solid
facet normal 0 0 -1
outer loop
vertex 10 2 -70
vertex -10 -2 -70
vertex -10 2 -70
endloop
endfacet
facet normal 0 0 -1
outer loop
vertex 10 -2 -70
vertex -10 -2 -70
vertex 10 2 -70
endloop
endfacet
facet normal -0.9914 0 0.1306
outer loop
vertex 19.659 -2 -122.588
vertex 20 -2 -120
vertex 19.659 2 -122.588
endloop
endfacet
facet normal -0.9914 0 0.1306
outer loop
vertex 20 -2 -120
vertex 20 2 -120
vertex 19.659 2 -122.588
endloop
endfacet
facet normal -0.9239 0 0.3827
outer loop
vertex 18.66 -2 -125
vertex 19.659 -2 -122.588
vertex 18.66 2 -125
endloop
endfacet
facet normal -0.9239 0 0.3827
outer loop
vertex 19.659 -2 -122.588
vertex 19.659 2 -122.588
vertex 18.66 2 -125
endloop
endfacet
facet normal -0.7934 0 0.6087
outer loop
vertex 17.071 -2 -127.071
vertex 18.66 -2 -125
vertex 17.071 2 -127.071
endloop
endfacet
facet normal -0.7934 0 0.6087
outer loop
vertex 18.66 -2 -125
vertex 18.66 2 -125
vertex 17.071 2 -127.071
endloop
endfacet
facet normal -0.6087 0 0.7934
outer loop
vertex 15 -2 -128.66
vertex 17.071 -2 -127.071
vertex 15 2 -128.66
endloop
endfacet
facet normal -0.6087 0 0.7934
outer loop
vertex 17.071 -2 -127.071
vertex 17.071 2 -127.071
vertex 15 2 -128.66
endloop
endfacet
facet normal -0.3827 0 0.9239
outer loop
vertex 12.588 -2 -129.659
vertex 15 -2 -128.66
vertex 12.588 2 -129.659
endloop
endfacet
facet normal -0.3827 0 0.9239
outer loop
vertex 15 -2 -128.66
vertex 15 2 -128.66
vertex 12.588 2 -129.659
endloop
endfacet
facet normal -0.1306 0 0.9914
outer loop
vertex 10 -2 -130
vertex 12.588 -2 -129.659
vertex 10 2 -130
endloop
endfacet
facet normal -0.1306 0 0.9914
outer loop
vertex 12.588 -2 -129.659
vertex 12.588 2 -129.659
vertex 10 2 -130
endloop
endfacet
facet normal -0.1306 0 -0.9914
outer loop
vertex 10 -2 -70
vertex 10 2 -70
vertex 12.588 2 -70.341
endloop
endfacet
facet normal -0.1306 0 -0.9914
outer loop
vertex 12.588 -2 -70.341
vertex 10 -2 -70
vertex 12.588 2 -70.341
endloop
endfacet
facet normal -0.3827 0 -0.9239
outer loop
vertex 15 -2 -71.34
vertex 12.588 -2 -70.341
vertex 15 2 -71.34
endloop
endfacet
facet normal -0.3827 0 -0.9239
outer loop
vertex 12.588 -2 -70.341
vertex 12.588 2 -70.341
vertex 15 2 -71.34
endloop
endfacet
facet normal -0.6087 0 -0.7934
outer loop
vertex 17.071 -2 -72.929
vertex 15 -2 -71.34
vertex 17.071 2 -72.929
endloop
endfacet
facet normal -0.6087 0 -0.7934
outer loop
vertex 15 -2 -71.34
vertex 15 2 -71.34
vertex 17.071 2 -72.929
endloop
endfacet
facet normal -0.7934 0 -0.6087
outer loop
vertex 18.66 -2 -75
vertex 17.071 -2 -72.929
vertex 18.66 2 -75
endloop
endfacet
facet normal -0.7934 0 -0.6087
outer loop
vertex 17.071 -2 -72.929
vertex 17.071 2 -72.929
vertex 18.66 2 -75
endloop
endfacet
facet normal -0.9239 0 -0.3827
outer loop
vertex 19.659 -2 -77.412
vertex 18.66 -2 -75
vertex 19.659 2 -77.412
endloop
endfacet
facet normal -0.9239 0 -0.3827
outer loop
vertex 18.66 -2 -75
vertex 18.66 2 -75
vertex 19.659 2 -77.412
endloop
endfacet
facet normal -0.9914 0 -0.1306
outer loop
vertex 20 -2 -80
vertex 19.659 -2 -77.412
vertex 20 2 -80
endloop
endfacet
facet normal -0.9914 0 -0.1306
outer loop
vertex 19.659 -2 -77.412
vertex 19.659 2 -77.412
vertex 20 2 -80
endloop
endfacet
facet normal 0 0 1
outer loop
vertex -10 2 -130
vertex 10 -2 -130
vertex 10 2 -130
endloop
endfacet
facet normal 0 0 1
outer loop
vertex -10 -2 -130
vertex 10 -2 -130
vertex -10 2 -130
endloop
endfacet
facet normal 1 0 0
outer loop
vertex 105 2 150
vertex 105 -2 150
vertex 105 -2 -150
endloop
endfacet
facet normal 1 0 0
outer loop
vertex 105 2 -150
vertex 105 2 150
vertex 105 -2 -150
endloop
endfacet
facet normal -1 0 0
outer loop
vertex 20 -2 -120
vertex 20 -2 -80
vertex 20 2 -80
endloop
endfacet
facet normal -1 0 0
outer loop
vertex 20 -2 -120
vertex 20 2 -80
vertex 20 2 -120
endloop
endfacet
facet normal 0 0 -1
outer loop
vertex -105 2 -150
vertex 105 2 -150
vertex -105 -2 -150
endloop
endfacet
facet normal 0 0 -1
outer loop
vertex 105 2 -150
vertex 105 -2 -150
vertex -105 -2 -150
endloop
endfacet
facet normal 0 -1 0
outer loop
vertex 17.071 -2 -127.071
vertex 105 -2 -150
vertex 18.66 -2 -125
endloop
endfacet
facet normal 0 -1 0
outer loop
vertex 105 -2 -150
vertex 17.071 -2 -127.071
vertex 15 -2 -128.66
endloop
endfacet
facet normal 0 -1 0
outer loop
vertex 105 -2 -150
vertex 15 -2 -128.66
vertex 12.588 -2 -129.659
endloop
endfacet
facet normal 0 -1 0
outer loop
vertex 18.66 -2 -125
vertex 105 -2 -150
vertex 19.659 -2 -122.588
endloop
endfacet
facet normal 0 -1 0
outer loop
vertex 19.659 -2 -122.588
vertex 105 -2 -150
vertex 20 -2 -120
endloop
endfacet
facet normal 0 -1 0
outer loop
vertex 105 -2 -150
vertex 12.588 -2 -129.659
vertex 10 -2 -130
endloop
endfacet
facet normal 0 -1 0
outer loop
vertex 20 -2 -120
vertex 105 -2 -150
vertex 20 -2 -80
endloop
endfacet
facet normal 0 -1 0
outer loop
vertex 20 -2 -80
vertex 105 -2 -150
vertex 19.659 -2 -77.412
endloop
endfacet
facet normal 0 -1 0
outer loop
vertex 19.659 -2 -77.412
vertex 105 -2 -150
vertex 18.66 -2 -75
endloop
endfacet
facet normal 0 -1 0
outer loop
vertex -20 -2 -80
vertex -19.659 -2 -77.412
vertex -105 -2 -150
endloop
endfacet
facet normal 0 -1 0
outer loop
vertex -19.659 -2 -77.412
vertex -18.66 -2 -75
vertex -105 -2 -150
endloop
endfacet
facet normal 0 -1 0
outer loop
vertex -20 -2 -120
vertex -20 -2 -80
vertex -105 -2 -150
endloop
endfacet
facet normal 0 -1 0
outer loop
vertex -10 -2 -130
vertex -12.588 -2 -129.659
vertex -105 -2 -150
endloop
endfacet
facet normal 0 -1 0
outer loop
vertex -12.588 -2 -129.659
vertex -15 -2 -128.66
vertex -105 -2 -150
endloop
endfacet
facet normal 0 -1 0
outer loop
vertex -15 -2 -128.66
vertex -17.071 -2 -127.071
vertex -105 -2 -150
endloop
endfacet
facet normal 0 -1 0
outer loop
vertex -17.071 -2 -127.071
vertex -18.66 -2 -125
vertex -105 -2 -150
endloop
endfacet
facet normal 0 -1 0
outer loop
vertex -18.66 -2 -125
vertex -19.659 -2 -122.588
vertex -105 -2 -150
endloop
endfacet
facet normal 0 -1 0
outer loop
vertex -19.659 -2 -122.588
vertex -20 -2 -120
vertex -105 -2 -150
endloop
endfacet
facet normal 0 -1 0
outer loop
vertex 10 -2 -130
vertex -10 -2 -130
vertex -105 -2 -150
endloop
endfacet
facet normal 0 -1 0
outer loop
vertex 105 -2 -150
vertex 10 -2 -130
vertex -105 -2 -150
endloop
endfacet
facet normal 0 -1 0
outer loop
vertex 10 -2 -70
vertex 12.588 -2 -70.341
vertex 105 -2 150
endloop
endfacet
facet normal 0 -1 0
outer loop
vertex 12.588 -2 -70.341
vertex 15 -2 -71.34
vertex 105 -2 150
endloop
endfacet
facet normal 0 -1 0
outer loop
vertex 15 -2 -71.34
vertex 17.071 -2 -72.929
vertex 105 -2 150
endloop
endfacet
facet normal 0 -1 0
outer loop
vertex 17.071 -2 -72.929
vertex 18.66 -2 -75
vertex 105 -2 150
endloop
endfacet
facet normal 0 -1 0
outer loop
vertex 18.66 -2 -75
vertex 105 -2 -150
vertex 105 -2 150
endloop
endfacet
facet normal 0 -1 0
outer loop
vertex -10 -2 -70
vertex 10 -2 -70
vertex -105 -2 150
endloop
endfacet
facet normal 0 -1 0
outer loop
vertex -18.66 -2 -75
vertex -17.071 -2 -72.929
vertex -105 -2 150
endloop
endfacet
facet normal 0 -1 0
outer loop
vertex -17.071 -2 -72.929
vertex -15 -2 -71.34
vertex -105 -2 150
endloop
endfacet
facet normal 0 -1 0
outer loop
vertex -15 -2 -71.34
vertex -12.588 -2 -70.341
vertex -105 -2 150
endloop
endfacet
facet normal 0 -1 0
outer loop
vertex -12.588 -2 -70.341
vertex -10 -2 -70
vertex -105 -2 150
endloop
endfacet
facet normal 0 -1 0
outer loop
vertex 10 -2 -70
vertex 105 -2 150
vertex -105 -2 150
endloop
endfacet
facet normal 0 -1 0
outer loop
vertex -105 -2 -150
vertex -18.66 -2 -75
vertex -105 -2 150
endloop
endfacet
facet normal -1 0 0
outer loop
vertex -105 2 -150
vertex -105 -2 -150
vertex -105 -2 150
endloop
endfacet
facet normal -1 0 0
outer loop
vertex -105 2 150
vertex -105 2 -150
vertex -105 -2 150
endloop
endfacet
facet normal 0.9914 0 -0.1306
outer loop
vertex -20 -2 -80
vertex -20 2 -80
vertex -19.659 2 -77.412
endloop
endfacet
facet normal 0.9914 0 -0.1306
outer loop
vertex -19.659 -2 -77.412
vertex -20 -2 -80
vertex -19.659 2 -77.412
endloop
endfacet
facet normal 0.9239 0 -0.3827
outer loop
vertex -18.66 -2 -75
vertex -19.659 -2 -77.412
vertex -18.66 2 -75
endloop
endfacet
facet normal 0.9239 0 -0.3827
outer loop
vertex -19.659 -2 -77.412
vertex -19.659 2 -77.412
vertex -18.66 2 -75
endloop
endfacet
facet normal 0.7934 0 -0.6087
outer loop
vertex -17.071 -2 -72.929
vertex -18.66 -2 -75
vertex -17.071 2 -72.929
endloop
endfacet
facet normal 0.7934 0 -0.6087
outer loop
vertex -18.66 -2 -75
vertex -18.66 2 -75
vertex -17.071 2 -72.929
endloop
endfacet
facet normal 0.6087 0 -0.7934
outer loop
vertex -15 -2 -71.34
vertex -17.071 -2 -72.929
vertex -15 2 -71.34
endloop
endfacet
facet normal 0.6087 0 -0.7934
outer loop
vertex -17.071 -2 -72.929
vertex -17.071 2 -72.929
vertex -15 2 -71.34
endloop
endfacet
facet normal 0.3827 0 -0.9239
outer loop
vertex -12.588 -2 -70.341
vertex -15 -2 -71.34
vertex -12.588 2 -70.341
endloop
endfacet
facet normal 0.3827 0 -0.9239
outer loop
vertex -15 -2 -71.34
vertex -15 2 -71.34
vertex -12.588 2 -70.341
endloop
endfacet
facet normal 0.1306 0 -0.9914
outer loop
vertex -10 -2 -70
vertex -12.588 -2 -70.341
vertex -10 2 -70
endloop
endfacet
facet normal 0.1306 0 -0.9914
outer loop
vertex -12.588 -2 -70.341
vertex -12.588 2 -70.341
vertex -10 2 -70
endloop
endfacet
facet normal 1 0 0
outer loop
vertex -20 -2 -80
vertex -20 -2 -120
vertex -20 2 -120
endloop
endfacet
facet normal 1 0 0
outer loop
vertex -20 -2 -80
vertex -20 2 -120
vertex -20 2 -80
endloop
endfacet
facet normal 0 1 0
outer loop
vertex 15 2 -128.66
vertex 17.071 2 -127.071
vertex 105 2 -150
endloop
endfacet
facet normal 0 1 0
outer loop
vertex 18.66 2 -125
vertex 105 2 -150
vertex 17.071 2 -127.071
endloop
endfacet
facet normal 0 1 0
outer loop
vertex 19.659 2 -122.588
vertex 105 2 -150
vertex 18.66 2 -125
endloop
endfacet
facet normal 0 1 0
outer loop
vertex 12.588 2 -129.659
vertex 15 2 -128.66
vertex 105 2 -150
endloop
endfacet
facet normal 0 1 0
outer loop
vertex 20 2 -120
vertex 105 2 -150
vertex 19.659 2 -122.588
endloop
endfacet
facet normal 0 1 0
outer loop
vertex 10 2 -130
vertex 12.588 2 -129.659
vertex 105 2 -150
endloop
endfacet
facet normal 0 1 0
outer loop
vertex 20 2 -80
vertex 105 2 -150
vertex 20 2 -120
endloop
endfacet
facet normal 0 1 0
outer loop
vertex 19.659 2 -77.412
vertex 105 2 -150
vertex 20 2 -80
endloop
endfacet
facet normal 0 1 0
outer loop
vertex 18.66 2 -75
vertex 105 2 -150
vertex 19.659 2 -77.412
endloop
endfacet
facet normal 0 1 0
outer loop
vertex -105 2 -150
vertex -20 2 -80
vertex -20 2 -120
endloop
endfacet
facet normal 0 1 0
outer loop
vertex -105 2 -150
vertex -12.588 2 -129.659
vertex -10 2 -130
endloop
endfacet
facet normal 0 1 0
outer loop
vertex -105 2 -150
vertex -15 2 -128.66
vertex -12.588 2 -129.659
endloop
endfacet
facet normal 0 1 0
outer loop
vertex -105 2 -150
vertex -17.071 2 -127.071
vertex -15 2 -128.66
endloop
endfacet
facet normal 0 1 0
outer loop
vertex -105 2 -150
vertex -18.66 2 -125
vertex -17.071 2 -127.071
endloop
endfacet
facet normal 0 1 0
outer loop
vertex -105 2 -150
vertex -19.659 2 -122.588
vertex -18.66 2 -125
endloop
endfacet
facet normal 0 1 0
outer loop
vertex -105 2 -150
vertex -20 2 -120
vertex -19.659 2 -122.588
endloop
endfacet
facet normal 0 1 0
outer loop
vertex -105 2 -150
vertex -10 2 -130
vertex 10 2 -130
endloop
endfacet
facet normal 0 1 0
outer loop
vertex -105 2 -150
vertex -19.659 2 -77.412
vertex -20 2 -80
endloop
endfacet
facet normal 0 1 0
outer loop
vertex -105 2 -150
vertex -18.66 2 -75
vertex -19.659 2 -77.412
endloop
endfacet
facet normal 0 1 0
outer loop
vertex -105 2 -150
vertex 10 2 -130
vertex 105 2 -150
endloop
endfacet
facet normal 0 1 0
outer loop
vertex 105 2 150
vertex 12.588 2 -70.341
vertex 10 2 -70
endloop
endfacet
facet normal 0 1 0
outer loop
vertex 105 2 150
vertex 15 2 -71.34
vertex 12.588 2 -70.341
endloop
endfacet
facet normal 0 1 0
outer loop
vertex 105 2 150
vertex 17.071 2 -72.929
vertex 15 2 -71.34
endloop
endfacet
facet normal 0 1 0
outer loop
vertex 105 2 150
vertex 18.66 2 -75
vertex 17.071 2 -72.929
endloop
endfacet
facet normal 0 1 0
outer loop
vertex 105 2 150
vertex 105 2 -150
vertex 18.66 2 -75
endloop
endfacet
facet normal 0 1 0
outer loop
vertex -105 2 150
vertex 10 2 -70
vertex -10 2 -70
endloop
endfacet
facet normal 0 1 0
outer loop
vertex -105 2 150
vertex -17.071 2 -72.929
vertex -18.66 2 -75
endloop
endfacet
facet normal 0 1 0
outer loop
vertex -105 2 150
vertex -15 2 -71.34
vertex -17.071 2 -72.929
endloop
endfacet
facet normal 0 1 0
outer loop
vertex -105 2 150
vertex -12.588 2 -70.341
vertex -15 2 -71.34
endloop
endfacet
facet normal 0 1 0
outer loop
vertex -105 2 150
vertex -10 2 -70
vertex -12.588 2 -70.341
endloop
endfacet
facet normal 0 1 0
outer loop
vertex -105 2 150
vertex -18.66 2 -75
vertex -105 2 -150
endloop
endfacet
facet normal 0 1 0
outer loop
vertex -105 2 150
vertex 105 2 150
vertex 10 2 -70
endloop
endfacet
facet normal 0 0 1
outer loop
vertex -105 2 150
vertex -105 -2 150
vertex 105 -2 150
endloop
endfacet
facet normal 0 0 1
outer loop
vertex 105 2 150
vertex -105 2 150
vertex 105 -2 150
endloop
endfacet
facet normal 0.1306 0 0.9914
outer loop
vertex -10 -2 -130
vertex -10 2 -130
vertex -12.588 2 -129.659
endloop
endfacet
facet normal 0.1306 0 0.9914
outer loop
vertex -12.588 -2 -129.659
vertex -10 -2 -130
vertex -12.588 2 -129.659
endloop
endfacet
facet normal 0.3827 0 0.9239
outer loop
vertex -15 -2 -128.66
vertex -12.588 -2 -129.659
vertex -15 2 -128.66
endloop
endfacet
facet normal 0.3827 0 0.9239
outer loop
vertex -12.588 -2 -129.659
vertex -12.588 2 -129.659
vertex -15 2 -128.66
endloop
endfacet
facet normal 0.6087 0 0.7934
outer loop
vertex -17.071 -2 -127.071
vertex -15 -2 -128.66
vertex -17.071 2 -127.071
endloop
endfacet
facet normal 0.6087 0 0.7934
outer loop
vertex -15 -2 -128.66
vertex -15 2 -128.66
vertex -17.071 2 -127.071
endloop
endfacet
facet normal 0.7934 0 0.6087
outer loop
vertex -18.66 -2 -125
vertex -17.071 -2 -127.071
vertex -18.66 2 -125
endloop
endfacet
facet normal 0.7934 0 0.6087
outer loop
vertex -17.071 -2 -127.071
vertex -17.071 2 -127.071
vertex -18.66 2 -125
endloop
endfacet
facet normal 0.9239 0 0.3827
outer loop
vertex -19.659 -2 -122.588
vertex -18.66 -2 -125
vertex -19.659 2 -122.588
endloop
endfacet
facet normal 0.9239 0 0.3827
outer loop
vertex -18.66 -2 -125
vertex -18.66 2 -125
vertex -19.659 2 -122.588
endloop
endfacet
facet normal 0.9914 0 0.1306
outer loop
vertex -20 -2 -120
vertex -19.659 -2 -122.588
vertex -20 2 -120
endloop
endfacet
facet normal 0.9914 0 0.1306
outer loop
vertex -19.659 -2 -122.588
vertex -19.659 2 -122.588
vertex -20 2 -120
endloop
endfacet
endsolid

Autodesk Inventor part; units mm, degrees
sketch "Эскиз2" plane through (0, 0, 0) normal (0, 1, 0) x (-1, 0, 0)
  line L0 (105, 150) -> (-105, 150)
  line L1 (-105, 150) -> (-105, -150)
  line L2 (-105, -150) -> (105, -150)
  line L3 (105, -150) -> (105, 150)
  line L4 (105, 150) -> (-105, -150) construction
  line L5 (-105, 150) -> (105, -150) construction
  point P0 (0, 0)
  dimension "d0" = 300
  dimension "d1" = 210
extrude "Выдавливание1" add sketch "Эскиз2" along normal mid plane 4
sketch "Эскиз3" plane through (0, -2, 0) normal (0, -1, 0) x (1, 0, 0)
  line L0 (105, -150) -> (-105, -150) projected
  line L1 (20, -150) -> (-20, -150)
  line L2 (-20, -150) -> (-20, -70)
  line L3 (-20, -70) -> (20, -70)
  line L4 (20, -70) -> (20, -150)
  line L5 (-105, 150) -> (-105, -150) projected
  line L6 (20, -130) -> (-20, -130)
  dimension "d7" = 40
  dimension "d9" = 80
  dimension "d10" = 20
  dimension "d12" = 85
extrude "Выдавливание2" cut sketch "Эскиз3" against normal up to next contours L6 L2 L3 L4
fillet "Сопряжение1" radius 10 4 edges at (20, 0, -130) (-20, 0, -130) (-20, 0, -70) (20, 0, -70)
ref_plane "РабПлоскость1" through (-10, -2, -100) normal (0, 0, 1) x (1, 0, 0)
properties part number "Передняя_фанера"
